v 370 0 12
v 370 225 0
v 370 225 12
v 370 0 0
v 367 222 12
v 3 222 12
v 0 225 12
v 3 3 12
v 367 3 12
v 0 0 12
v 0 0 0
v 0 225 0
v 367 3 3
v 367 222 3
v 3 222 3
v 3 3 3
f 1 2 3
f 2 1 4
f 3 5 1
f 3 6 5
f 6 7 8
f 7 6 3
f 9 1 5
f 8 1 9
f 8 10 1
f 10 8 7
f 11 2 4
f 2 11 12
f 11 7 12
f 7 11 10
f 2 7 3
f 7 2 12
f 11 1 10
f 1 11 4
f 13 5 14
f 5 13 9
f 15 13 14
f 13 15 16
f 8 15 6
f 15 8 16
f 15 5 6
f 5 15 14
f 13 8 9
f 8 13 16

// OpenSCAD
// ModuDeck donor chassis study: NOT a verified ThinkPad fit.
// Millimetres. 370x240 is an unconfirmed owner measurement.
$fn=32; W=370; D=240; t=3;
module plate(w,d,h){cube([w,d,h]);}
module shell(w,d,h){difference(){cube([w,d,h]);translate([t,t,t])cube([w-2*t,d-2*t,h]);}}
module hole(x,y,h){translate([x,y,-1])cylinder(d=3.4,h=h+2);}
module rail(n){difference(){cube([n,12,6]);for(x=[10:20:n-10])hole(x,6,6);}}
module rear(){difference(){cube([W-6,3,25]);translate([W/2-23,-1,6])cube([40,5,14]);for(x=[10,W-16])translate([x,-1,12])rotate([-90,0,0])cylinder(d=3.4,h=5);}}
module tray(){difference(){shell(W,D,30);translate([3,D-4,3])cube([W-6,6,27]);for(x=[15,W-15],y=[15,D-15])hole(x,y,30);}}
shell(W,225,12);
